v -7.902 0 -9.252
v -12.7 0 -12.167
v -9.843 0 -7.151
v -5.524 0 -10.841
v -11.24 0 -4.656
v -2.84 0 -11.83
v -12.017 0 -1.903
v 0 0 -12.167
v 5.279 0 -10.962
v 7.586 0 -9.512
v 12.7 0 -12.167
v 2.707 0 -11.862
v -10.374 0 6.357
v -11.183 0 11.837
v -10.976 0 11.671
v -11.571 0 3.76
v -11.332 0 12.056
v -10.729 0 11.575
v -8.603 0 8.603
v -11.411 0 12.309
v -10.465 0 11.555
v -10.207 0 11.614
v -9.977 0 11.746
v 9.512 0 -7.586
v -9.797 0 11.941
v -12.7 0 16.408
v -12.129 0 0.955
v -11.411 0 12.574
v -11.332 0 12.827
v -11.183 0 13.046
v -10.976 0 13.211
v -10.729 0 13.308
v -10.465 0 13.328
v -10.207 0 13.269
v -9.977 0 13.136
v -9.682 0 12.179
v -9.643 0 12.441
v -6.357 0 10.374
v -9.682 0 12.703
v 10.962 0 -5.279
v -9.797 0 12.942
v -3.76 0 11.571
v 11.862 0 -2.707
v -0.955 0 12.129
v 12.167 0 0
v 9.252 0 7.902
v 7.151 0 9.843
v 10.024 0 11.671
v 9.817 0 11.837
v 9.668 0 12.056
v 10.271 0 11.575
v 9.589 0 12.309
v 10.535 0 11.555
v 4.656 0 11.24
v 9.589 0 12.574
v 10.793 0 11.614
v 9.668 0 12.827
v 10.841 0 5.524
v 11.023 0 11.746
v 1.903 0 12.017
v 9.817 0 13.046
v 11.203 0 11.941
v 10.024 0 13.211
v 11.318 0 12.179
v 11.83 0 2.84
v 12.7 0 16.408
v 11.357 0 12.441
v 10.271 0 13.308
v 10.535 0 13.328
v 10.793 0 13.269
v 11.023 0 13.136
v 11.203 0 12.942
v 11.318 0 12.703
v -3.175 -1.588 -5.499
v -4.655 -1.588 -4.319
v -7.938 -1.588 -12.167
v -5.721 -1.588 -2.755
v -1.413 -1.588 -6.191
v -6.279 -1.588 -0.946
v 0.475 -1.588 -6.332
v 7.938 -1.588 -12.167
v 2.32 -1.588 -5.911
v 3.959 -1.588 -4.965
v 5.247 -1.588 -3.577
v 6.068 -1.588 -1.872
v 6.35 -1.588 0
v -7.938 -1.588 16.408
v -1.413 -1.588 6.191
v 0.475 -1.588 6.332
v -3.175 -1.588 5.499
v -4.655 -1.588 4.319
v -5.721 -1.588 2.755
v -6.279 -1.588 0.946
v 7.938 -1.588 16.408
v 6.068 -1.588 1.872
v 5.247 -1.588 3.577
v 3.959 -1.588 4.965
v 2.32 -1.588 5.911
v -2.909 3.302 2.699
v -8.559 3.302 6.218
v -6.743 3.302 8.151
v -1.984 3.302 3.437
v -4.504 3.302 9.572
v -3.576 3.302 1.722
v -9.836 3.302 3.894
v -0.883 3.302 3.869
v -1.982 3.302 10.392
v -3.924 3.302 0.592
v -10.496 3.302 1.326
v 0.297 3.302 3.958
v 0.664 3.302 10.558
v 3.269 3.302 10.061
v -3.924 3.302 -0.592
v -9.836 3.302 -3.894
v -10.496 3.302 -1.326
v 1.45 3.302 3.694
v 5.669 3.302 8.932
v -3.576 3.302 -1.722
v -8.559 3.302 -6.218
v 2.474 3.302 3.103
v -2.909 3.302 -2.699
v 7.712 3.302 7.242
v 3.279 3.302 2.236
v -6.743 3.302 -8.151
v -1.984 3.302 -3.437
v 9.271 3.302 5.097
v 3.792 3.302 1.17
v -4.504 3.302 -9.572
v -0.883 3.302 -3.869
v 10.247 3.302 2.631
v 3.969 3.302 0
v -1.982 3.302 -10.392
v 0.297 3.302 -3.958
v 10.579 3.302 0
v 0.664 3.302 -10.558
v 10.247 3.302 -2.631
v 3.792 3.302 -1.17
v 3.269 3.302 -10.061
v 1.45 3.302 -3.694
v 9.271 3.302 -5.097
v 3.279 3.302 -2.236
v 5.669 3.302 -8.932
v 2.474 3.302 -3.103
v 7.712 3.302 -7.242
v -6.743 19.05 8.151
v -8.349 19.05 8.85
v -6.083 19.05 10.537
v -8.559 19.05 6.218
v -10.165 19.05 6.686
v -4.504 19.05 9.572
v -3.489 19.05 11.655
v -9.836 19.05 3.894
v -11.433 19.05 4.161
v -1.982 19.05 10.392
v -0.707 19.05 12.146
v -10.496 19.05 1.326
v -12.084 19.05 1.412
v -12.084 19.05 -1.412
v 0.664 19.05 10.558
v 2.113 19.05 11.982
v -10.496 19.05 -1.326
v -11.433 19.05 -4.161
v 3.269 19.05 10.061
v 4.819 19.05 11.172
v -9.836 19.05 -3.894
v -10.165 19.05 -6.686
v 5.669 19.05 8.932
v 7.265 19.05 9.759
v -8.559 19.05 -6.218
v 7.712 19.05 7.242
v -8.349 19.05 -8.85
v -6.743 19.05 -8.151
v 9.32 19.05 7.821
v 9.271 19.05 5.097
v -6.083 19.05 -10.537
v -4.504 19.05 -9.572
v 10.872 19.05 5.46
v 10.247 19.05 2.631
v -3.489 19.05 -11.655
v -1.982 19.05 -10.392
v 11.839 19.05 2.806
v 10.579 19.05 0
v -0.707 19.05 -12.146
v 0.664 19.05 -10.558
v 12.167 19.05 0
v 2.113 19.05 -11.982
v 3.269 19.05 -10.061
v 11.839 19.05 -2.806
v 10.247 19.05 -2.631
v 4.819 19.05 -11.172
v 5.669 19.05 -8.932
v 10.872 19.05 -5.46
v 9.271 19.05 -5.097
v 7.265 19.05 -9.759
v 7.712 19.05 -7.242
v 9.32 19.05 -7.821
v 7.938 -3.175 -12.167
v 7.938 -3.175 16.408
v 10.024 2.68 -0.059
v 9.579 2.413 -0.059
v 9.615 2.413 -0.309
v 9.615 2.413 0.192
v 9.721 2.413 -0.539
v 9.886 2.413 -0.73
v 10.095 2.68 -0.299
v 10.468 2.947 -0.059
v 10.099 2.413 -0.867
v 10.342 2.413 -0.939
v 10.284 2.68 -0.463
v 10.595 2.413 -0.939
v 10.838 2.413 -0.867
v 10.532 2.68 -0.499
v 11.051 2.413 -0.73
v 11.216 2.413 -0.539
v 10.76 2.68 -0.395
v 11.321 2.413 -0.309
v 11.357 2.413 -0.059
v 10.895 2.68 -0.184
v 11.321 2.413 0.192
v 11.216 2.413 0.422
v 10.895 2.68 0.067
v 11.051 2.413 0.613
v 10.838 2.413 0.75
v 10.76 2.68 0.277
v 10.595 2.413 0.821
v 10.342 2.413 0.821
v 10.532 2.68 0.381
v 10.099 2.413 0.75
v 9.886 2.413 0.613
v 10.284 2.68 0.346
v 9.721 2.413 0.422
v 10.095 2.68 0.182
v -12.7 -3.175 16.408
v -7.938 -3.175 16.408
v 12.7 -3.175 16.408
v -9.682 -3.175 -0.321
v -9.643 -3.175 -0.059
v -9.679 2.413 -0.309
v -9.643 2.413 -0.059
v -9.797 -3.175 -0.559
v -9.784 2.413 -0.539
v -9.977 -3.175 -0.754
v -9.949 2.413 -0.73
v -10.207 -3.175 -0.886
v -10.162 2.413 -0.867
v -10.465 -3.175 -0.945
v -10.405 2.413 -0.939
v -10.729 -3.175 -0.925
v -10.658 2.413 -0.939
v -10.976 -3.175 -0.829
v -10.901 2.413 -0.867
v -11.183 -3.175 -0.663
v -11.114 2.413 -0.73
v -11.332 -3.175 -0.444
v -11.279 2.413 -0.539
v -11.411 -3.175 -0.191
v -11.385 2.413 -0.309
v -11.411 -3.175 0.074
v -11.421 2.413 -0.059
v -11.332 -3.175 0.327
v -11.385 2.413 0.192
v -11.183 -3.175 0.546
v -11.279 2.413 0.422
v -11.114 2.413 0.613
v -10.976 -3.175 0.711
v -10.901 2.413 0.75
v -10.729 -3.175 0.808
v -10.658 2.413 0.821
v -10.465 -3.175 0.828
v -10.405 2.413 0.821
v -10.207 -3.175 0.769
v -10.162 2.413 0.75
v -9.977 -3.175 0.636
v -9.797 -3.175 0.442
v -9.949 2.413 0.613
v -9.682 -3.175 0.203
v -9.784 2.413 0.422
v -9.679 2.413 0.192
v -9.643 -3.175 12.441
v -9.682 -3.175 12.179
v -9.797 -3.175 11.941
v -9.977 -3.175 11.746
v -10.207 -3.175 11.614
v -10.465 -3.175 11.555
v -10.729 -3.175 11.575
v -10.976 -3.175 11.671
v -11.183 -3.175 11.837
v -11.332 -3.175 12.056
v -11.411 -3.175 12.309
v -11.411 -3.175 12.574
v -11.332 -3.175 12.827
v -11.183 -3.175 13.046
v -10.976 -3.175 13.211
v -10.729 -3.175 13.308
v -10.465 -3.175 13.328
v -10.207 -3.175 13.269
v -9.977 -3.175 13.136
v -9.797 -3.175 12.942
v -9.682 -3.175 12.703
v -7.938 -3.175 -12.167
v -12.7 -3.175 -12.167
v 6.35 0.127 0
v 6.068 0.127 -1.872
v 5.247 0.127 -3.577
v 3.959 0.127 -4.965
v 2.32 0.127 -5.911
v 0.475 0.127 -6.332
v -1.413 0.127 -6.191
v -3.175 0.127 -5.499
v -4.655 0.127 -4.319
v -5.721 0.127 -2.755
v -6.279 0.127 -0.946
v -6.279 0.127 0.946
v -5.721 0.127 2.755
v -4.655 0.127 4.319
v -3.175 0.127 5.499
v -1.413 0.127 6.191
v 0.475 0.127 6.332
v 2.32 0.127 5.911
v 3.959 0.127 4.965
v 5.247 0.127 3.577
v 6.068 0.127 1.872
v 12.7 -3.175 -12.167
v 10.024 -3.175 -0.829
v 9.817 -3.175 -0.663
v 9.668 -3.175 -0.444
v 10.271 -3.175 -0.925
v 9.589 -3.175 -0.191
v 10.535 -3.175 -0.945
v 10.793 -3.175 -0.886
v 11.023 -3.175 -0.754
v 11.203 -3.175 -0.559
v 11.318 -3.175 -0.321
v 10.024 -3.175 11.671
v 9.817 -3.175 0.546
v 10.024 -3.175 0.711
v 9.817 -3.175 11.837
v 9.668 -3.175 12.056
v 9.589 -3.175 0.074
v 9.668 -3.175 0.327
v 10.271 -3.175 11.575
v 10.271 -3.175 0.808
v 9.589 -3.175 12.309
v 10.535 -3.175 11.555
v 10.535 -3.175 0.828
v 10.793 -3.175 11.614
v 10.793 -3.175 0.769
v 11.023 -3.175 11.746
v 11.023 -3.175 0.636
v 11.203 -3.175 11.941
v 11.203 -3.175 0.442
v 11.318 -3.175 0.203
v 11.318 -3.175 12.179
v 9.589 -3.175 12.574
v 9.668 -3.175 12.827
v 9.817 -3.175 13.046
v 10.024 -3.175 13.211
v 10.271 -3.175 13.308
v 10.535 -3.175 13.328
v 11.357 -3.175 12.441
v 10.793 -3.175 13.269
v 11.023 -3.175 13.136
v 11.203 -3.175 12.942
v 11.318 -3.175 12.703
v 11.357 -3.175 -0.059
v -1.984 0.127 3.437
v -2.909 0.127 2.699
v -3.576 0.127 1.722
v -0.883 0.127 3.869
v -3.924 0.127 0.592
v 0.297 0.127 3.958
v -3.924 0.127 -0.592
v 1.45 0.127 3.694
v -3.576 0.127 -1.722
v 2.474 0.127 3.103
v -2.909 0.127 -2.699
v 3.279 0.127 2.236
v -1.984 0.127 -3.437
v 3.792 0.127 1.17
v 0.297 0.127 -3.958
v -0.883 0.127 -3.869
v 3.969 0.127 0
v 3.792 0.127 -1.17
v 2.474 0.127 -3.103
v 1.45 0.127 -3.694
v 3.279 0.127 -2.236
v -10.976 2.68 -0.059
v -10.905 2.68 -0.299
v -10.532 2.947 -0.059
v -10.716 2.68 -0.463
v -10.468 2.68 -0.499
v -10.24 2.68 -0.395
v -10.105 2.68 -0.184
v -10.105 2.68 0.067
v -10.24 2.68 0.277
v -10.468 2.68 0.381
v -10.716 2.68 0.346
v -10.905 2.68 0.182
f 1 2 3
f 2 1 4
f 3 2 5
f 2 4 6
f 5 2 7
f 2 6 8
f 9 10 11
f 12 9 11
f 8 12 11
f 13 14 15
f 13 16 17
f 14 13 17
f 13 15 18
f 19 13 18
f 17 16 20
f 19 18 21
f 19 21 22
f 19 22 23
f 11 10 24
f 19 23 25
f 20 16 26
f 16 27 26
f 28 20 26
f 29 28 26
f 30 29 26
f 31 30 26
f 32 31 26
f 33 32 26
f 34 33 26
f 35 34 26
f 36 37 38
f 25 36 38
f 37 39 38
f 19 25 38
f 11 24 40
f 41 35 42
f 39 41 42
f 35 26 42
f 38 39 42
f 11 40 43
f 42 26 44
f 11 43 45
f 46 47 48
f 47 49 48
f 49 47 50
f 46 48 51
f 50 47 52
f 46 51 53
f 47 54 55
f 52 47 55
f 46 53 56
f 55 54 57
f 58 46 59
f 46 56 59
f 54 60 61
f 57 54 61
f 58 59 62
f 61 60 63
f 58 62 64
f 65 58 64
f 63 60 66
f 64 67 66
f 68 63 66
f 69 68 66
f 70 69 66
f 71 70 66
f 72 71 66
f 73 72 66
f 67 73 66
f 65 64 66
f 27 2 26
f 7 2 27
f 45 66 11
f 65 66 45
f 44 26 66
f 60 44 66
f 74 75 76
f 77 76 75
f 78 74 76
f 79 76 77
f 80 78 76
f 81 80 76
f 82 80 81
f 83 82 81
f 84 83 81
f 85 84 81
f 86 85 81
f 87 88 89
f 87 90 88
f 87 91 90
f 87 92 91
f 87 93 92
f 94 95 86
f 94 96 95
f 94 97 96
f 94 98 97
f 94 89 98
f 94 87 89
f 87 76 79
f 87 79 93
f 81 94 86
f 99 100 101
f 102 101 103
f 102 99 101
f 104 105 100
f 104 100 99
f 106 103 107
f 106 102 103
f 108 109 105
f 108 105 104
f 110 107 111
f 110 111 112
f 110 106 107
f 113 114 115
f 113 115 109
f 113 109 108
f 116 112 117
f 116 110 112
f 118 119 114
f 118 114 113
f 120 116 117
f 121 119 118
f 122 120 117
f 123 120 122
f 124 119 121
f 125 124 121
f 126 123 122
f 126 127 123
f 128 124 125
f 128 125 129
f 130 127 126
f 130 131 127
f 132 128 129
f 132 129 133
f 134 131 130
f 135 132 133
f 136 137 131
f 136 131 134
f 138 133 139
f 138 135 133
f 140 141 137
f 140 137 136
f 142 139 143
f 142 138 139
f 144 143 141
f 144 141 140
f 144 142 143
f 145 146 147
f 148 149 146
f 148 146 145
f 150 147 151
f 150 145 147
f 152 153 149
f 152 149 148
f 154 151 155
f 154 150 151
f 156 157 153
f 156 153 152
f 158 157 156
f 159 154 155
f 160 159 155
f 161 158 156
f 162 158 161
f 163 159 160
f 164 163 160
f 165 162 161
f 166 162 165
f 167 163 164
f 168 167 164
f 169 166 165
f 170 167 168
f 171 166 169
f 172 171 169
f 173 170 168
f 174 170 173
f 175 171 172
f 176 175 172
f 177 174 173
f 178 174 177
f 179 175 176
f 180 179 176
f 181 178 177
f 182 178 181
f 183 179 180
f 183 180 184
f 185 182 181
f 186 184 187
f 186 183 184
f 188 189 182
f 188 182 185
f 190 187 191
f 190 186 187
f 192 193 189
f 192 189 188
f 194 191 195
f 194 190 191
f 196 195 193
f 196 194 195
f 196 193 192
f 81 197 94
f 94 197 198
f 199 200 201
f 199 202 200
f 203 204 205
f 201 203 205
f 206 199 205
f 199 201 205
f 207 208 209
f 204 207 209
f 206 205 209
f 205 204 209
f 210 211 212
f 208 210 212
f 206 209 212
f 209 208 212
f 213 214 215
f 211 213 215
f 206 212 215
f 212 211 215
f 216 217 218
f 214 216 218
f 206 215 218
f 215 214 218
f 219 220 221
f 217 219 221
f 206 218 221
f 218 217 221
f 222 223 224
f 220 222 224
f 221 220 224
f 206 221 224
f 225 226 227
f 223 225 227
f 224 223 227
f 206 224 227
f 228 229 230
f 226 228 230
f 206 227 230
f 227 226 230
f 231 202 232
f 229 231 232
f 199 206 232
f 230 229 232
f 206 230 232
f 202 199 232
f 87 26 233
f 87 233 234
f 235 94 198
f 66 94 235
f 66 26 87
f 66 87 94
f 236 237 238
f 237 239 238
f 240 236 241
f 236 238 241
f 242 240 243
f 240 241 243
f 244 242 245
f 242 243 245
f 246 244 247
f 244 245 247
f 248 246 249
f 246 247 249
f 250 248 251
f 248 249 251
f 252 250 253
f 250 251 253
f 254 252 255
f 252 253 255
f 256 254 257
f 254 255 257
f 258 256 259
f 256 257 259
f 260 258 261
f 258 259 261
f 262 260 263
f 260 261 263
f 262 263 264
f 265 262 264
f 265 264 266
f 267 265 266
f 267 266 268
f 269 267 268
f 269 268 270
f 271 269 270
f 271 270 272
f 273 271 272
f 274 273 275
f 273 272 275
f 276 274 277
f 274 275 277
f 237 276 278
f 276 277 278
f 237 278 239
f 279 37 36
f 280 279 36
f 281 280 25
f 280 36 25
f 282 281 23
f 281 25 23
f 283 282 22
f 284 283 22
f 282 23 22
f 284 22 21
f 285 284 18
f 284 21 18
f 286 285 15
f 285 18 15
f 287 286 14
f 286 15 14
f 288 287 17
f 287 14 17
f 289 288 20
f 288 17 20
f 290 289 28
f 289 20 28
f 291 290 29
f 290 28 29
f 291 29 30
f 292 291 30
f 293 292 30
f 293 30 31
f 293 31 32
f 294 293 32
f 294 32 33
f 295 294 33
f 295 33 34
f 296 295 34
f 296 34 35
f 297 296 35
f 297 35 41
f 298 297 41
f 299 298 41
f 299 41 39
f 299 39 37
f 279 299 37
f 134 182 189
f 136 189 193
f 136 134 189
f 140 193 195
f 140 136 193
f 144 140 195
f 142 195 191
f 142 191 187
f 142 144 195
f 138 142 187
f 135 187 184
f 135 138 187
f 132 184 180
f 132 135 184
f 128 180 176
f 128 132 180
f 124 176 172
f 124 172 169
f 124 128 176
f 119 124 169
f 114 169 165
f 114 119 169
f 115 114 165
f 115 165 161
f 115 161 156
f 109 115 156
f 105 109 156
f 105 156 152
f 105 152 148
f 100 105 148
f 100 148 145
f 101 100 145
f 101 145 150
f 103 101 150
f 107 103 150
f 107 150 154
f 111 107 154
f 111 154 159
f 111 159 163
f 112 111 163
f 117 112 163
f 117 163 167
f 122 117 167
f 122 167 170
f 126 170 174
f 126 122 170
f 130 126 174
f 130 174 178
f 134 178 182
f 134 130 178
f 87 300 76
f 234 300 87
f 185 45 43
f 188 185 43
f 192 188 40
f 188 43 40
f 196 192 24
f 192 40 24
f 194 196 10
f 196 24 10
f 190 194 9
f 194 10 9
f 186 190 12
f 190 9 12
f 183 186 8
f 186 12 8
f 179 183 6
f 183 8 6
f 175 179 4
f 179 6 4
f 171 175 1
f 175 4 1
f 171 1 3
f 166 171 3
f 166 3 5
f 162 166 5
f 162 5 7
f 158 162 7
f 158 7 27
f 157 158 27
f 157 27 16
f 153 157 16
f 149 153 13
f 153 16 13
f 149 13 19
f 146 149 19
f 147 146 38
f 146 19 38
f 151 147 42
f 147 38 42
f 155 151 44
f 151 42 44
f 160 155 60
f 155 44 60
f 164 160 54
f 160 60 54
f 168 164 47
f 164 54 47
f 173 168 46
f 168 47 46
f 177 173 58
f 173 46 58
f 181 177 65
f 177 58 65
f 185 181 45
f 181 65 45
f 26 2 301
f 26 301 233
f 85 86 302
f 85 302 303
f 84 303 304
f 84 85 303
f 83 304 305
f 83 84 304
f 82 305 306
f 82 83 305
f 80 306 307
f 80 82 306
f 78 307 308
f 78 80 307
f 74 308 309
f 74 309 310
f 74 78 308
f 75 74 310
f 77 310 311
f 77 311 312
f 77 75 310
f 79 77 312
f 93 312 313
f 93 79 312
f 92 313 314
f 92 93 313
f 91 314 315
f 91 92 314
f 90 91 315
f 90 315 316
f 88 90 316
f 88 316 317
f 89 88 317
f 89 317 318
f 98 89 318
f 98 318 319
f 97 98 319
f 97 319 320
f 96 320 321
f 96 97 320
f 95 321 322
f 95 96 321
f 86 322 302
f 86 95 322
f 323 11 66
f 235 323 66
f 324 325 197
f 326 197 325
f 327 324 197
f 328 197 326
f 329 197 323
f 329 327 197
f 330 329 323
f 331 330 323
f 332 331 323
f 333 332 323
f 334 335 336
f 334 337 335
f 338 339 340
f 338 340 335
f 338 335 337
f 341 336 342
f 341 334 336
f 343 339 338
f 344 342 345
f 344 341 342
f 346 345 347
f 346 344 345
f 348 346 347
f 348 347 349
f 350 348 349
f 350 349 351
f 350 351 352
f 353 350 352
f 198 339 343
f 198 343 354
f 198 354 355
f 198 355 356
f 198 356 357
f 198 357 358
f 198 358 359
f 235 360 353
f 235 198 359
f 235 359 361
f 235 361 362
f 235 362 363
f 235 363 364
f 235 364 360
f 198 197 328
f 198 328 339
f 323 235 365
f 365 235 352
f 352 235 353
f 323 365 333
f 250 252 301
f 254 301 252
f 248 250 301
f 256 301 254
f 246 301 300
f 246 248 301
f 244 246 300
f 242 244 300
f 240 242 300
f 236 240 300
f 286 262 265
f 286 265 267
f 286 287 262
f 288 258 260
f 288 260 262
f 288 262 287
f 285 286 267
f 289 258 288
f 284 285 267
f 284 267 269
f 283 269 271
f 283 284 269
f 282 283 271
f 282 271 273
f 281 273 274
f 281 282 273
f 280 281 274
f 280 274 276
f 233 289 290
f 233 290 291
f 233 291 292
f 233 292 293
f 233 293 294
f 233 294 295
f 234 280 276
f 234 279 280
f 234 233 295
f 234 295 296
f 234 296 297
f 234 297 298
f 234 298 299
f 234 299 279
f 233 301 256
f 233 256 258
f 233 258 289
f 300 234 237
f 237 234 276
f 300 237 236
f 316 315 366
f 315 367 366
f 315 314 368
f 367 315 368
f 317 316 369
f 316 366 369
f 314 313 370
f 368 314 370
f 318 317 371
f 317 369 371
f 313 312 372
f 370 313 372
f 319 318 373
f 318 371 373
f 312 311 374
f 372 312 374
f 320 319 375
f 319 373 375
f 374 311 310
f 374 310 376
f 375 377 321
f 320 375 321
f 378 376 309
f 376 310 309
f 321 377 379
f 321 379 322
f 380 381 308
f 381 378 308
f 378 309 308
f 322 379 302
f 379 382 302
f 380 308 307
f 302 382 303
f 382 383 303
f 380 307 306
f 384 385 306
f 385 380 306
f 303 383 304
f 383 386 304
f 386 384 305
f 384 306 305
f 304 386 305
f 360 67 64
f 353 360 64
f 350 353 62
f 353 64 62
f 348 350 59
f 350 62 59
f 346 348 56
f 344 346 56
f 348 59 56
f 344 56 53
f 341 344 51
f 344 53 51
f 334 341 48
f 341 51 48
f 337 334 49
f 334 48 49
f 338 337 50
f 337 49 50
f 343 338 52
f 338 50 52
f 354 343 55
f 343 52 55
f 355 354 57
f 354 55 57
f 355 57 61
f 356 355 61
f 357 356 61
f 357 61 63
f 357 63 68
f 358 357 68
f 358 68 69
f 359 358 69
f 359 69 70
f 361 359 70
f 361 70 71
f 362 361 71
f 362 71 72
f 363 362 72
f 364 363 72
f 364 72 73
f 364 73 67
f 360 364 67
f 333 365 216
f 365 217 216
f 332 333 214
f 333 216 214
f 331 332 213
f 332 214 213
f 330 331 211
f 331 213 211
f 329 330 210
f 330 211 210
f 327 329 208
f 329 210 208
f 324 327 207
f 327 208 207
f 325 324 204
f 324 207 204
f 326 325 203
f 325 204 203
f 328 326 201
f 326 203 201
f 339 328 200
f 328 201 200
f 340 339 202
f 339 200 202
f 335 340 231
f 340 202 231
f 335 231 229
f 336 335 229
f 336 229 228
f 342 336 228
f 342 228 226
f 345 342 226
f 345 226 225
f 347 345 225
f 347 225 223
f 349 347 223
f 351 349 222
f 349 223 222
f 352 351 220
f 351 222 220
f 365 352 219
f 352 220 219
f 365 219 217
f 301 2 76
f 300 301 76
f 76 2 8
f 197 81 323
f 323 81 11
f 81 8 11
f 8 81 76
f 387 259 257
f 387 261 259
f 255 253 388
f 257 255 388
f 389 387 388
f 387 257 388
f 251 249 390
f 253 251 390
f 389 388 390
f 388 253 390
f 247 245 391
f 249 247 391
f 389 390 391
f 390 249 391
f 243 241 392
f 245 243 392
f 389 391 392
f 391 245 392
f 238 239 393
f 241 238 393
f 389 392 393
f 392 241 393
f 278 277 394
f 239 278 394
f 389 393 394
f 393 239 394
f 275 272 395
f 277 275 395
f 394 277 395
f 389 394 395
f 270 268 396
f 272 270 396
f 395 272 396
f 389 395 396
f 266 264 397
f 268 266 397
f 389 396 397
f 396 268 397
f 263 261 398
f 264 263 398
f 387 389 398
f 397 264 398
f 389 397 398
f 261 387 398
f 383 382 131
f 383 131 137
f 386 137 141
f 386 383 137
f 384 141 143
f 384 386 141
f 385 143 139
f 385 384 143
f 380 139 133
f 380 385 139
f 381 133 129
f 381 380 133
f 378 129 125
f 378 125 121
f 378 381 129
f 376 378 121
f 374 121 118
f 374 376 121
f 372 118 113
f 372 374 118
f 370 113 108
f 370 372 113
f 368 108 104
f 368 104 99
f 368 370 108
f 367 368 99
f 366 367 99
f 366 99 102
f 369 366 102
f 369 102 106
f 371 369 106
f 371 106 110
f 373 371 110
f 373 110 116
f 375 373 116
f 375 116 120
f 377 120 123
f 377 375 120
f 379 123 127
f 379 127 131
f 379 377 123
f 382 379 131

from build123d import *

# Parameters (mm, degrees)
SKETCH1_R                 = 12.1666
SKETCH1_R_2               = 10.5791
BOSS_EXTRUDE1_DEPTH       = 19.05
SKETCH2_W                 = 25.4
SKETCH2_H                 = 28.575
BOSS_EXTRUDE2_DEPTH       = 3.175
SKETCH3_R                 = 6.35
CUT_EXTRUDE1_DEPTH        = 23.225
SKETCH8_R                 = 10.5791
SKETCH8_R_2               = 6.35
BOSS_EXTRUDE4_DEPTH       = 0.127
SKETCH9_R                 = 10.5791
SKETCH9_R_2               = 3.96875
BOSS_EXTRUDE5_DEPTH       = 3.175
F_2_56_TAPPED_HOLE1_D     = 1.778
F_2_56_TAPPED_HOLE1_DEPTH = 5.588
F_2_56_TAPPED_HOLE1_TIP   = 0.53416509
SKETCH6_W                 = 15.875
SKETCH6_H                 = 37.082262956
CUT_EXTRUDE2_DEPTH        = 1.5875


with BuildPart() as part:
    # Sketch1 → Boss-Extrude1 (new body)
    with BuildSketch(Plane(origin=(0, 0, 0), x_dir=(1, 0, 0), z_dir=(0, 1, 0))):
        Circle(SKETCH1_R)
        Circle(SKETCH1_R_2, mode=Mode.SUBTRACT)
    extrude(amount=BOSS_EXTRUDE1_DEPTH)

    # Sketch2 → Boss-Extrude2 (add)
    with BuildSketch(Plane.XZ):
        with Locations((0, 2.1209)):
            Rectangle(SKETCH2_W, SKETCH2_H)
    extrude(amount=BOSS_EXTRUDE2_DEPTH)

    # Sketch3 → Cut-Extrude1 (cut, through all)
    with BuildSketch(Plane.XZ.offset(3.175)):
        Circle(SKETCH3_R)
    extrude(amount=-CUT_EXTRUDE1_DEPTH, mode=Mode.SUBTRACT)

    # Sketch8 → Boss-Extrude4 (add)
    with BuildSketch(Plane(origin=(0, 0, 0), x_dir=(1, 0, 0), z_dir=(0, 1, 0))):
        Circle(SKETCH8_R)
        Circle(SKETCH8_R_2, mode=Mode.SUBTRACT)
    extrude(amount=BOSS_EXTRUDE4_DEPTH)

    # Sketch9 → Boss-Extrude5 (add)
    with BuildSketch(Plane(origin=(0, 0.127, 0), x_dir=(1, 0, 0), z_dir=(0, 1, 0))):
        Circle(SKETCH9_R)
        Circle(SKETCH9_R_2, mode=Mode.SUBTRACT)
    extrude(amount=BOSS_EXTRUDE5_DEPTH)

    # #2-56 Tapped Hole1
    with Locations(Plane(origin=(0, -3.175, 0), x_dir=(-1, 0, 0), z_dir=(0, -1, 0))):
        with Locations((10.531523735, -12.441379328), (10.531523735, 0.058620672), (-10.468476265, -12.441379328), (-10.468476265, 0.058620672)):
            Hole(F_2_56_TAPPED_HOLE1_D / 2, depth=F_2_56_TAPPED_HOLE1_DEPTH)
            with Locations((0, 0, -(F_2_56_TAPPED_HOLE1_DEPTH + F_2_56_TAPPED_HOLE1_TIP / 2))):  # 118° drill point
                Cone(0, F_2_56_TAPPED_HOLE1_D / 2, F_2_56_TAPPED_HOLE1_TIP, mode=Mode.SUBTRACT)

    # Sketch6 → Cut-Extrude2 (cut)
    with BuildSketch(Plane.XZ.offset(3.175)):
        Rectangle(SKETCH6_W, SKETCH6_H)
    extrude(amount=-CUT_EXTRUDE2_DEPTH, mode=Mode.SUBTRACT)


solid = part.part
